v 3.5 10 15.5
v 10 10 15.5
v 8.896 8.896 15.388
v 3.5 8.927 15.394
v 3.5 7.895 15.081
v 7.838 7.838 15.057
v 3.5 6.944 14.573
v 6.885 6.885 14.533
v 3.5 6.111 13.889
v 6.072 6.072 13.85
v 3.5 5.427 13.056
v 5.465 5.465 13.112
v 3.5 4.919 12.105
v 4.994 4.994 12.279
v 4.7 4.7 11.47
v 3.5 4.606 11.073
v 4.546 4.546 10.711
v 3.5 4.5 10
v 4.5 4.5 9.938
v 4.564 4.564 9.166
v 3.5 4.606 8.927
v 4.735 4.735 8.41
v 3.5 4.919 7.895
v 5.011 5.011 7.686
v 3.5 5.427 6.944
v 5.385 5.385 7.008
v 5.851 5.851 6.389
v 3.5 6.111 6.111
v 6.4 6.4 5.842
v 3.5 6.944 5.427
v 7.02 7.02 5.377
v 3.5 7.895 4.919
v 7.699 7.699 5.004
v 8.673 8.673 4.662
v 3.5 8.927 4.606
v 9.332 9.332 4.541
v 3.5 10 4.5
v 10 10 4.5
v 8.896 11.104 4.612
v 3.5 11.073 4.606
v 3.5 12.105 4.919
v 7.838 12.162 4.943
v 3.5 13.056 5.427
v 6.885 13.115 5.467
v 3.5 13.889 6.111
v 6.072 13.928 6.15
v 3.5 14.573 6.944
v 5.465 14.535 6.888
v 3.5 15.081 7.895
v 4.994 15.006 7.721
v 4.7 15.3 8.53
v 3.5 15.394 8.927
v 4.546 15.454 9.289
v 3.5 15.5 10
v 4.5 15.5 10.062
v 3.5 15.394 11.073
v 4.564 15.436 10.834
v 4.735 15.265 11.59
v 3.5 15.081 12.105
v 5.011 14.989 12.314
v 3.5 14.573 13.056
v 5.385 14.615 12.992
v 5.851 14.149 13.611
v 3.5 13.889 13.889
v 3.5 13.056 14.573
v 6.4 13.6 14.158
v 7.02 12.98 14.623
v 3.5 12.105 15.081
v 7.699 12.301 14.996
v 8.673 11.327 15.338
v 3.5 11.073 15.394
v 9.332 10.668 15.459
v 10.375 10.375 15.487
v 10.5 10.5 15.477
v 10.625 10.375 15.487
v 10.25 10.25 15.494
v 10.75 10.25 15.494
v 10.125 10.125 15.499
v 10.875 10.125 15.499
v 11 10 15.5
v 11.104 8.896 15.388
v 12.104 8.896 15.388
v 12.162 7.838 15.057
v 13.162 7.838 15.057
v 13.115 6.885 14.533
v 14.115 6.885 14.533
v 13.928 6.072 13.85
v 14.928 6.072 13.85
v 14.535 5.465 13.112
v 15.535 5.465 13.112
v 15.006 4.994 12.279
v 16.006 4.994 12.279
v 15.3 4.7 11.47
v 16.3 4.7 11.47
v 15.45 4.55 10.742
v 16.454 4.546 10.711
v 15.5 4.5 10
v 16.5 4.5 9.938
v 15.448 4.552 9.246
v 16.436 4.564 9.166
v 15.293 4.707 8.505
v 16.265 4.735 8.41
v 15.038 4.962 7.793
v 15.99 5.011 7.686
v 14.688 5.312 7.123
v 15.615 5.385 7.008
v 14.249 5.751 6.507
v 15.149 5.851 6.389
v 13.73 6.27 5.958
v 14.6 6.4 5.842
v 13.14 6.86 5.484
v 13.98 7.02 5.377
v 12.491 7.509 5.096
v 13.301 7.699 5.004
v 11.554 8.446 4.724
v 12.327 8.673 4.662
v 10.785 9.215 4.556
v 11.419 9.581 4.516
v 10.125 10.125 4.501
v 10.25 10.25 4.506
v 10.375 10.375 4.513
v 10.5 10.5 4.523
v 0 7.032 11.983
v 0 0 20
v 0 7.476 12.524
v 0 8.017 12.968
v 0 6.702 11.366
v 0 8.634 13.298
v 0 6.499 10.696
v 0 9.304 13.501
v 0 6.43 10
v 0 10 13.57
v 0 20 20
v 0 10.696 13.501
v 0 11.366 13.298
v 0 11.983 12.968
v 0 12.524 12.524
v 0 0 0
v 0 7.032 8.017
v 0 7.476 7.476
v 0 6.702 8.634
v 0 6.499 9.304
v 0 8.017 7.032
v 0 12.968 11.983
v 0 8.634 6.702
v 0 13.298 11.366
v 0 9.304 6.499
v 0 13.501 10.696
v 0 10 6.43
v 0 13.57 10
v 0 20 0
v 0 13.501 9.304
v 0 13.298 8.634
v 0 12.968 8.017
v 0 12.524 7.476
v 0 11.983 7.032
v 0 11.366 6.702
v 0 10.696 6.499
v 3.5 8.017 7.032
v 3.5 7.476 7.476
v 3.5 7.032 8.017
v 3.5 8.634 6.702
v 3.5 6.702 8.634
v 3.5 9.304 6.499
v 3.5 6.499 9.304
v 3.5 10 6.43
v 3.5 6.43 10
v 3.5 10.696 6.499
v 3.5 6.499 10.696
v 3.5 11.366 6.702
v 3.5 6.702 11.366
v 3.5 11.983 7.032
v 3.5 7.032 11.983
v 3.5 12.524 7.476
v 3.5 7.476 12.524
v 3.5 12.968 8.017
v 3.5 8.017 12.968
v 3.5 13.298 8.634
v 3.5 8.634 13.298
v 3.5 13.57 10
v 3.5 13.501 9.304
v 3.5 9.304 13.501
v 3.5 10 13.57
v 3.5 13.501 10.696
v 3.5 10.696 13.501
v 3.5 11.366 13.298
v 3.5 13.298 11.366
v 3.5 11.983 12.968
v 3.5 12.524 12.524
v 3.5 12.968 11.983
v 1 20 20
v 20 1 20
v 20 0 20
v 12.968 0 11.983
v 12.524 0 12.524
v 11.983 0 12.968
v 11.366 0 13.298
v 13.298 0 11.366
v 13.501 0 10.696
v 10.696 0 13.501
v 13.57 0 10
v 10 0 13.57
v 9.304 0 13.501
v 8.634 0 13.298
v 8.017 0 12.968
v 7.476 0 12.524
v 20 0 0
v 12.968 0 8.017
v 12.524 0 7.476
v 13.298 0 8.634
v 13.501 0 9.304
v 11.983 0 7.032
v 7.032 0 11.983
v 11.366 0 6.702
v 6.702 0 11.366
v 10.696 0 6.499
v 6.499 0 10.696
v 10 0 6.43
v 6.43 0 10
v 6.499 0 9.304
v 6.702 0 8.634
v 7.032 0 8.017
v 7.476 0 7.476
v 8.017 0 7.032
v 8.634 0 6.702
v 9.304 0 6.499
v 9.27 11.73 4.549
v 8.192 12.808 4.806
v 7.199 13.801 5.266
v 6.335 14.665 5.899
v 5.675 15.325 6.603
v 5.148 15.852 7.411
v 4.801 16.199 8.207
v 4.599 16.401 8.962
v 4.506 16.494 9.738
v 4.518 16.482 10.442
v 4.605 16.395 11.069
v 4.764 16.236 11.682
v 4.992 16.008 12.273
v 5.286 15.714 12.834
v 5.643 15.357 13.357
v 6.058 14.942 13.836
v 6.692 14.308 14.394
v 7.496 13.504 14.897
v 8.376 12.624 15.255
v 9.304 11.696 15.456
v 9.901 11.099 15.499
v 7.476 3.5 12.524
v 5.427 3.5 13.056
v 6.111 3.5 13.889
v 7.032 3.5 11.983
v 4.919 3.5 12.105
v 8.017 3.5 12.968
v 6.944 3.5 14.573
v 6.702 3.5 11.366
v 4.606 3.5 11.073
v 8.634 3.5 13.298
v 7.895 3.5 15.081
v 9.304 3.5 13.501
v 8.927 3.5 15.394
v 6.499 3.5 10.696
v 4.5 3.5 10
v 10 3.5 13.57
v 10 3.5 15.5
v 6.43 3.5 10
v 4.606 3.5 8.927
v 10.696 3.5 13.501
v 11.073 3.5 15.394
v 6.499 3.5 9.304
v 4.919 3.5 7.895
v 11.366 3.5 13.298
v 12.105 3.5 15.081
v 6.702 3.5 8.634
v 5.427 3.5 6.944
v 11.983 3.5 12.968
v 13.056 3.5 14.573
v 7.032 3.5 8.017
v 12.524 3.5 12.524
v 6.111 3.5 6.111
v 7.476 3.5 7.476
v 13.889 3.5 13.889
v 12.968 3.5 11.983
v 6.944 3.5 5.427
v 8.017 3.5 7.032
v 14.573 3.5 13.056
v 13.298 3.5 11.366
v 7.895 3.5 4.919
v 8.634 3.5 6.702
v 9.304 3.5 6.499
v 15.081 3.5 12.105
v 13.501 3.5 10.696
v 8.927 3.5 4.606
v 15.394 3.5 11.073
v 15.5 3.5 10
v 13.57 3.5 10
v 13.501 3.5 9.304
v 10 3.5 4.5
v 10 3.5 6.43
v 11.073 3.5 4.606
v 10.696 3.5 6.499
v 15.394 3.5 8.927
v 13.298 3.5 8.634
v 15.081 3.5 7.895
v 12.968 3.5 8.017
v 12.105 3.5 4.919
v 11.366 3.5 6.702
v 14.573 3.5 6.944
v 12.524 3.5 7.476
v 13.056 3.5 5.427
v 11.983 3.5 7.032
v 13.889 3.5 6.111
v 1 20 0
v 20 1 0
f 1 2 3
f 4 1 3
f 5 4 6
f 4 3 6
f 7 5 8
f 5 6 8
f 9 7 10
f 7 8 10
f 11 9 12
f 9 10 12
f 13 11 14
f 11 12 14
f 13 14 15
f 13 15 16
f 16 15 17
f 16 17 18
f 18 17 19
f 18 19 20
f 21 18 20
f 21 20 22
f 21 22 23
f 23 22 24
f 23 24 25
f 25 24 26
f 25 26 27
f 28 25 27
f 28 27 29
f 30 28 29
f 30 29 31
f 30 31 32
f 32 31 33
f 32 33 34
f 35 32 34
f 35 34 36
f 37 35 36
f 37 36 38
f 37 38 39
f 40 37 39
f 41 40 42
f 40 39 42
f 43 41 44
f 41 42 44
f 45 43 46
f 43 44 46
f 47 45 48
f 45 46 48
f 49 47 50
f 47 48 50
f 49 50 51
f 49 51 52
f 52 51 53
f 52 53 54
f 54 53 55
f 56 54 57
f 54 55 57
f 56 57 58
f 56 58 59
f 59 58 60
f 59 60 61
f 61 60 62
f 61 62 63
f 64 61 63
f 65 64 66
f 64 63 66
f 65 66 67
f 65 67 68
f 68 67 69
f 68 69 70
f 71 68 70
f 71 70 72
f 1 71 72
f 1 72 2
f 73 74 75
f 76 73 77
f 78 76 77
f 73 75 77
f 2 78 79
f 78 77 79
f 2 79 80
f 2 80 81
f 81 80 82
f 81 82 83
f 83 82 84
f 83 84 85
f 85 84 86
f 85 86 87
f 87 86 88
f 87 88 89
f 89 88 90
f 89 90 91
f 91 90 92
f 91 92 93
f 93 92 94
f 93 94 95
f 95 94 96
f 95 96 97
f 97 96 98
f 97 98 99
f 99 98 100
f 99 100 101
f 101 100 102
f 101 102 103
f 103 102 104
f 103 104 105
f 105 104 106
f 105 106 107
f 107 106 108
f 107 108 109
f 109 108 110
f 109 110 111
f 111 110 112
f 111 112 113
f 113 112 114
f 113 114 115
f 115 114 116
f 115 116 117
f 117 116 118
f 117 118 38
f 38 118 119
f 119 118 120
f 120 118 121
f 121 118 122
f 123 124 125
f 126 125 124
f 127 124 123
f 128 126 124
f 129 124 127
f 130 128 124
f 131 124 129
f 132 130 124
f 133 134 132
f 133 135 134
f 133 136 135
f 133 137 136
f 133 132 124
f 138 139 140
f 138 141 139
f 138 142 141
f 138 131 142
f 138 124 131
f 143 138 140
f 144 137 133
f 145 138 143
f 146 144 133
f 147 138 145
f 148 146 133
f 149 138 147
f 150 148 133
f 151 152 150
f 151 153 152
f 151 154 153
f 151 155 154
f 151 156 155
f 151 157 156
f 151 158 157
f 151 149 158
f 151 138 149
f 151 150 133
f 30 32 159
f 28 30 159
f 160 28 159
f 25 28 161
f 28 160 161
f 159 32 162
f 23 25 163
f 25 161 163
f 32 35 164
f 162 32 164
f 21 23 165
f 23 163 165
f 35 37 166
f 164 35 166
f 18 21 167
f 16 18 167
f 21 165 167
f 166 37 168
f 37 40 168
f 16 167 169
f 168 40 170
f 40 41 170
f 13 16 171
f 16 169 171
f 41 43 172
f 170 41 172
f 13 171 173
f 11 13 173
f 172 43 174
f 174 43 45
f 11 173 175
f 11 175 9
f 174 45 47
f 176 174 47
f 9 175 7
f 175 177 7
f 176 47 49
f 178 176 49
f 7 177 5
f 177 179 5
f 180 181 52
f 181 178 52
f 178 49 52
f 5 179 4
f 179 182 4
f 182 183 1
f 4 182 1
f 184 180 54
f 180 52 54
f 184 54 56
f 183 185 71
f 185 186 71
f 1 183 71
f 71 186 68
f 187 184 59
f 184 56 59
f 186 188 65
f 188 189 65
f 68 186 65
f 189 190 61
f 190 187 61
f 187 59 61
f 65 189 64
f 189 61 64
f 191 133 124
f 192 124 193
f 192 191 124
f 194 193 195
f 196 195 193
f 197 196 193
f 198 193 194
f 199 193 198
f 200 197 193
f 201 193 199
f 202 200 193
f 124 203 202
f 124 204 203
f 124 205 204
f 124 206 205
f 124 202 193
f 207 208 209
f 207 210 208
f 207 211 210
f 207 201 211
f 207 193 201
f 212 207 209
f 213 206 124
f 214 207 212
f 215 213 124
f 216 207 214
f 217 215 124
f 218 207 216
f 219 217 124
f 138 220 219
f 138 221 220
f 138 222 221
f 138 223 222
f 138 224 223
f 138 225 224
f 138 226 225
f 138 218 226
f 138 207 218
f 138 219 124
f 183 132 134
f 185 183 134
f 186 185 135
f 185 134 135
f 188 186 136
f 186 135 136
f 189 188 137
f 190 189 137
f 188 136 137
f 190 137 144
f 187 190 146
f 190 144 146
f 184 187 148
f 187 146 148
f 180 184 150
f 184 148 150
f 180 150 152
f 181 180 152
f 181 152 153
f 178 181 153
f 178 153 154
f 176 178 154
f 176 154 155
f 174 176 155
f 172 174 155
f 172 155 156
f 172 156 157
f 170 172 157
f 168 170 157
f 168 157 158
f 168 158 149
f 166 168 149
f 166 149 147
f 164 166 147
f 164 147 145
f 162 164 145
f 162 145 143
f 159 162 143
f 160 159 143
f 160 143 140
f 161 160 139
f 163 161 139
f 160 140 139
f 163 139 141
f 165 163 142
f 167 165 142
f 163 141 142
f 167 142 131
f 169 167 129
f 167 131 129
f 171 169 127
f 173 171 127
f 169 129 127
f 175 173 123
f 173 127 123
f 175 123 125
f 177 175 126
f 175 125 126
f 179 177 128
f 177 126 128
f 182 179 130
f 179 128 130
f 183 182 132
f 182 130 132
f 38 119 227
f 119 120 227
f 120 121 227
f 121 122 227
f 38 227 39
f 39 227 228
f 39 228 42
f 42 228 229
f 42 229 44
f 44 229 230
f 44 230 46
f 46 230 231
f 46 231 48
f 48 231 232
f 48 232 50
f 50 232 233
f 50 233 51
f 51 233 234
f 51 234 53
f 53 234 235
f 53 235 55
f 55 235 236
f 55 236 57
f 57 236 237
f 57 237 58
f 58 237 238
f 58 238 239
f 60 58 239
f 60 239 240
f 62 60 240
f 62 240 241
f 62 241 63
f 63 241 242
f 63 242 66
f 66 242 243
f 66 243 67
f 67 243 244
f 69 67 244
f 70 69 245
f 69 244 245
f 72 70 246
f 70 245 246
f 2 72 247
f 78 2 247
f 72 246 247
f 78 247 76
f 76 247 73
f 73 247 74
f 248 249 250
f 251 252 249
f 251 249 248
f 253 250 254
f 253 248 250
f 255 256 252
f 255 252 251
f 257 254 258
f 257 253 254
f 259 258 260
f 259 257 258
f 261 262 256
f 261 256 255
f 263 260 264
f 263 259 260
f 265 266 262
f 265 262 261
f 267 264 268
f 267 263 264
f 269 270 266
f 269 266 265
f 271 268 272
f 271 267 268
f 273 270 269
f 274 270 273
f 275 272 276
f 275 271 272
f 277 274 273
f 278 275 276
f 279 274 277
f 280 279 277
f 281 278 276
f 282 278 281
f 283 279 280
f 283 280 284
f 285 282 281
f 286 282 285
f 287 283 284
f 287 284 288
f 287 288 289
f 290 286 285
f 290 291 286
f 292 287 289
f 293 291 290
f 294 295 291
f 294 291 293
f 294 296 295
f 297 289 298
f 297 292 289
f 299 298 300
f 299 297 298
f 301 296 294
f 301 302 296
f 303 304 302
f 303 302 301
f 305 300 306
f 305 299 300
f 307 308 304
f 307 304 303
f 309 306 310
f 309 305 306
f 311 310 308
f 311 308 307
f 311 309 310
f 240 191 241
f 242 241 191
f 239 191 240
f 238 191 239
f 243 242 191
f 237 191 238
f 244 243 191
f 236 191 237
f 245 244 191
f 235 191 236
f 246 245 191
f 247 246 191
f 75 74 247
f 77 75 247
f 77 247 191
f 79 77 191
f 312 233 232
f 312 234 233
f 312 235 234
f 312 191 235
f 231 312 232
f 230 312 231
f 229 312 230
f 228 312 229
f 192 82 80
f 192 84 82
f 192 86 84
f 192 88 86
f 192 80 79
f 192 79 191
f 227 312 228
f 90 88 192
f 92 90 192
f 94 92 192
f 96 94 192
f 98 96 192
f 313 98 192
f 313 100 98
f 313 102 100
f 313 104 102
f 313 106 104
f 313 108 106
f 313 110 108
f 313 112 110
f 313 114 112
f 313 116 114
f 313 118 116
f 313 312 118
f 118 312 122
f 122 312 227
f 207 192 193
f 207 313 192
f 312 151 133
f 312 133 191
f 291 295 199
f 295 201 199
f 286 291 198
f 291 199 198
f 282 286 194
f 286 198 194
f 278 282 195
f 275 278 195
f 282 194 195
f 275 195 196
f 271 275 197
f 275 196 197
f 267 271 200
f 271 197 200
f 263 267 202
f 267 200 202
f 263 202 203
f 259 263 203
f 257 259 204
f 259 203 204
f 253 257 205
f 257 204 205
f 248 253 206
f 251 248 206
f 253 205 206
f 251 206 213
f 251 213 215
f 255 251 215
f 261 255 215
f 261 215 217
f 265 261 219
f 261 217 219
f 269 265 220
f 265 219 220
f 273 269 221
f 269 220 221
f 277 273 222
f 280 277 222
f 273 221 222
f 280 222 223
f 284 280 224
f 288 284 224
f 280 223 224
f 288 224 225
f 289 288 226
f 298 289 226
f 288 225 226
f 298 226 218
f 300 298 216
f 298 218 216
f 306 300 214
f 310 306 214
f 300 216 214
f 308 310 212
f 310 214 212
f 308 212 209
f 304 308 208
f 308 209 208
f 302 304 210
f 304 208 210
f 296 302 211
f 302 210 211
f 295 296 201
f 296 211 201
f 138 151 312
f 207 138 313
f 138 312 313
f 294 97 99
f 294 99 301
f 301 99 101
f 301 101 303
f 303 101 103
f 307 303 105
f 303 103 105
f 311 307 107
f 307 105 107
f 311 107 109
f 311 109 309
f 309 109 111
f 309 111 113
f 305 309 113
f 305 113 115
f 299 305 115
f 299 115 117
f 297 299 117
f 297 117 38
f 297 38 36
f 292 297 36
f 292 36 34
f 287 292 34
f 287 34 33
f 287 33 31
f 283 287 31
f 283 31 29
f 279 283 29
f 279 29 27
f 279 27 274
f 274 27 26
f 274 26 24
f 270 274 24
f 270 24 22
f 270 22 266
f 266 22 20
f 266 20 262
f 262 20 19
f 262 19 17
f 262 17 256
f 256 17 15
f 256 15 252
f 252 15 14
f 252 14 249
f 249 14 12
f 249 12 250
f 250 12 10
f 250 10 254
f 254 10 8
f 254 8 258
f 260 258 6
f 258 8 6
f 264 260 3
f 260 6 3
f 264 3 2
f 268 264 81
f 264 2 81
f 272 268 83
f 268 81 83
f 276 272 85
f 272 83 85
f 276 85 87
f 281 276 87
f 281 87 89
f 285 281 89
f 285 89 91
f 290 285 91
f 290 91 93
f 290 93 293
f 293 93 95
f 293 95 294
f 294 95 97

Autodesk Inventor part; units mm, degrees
ref_plane "YZ Plane" through (0, 0, 0) normal (1, 0, 0) x (0, 1, 0)
ref_plane "XZ Plane" through (0, 0, 0) normal (0, 1, 0) x (-1, 0, 0)
sketch "Sketch1" plane through (0, 0, 0) normal (0, 0, 1) x (1, 0, 0)
  line L0 (0, 0) -> (0, 20)
  line L1 (20, 0) -> (0, 0)
  line L2 (0, 20) -> (1, 20)
  line L3 (1, 20) -> (20, 1.0001)
  line L4 (20, 1.0001) -> (20, 0)
  dimension "d0" = 20
  dimension "d1" = 20
  dimension "d2" = 1
  dimension "d3" = 26.87
  dimension "d4" = 1.0001
extrude "Extrusion1" add sketch "Sketch1" along normal blind 20
sketch "Sketch2" plane through (0, 0, 0) normal (-1, 0, 0) x (0, 0, 1)
  line L0 (0, 0) -> (20, 0) projected
  circle A0 centre (10, 10) radius 3.57
  circle A1 centre (10, 10) radius 5.5
  line L1 (10, 19.6278) -> (10, 0) construction
  dimension "d7" = 7.14
  dimension "d8" = 11
  dimension "d9" = 4.5
extrude "Extrusion2" cut sketch "Sketch2" against normal through all contours A0
sketch "Sketch3" plane through (0, 0, 0) normal (0, -1, 0) x (1, 0, 0)
  circle A0 centre (10, 10) radius 3.57
  dimension "d12" = 7.14
extrude "Extrusion3" cut sketch "Sketch3" against normal through all
ref_plane "Work Plane1" through (20, 1.0001, 20) normal (-1, 0, 0) x (0, 0, 1)
sketch "Sketch4" plane through (20, 1.0001, 20) normal (-1, 0, 0) x (0, 0, 1)
  circle A0 centre (-10, 8.9999) radius 3.57 projected
  circle A1 centre (-10, 8.9999) radius 5.5
  point P0 (-20, -1.0001)
  dimension "d15" = 11
extrude "Extrusion4" cut sketch "Sketch4" along normal blind 16.5
sketch "Sketch5" plane through (0, 20, 0) normal (0, 1, 0) x (1, 0, 0)
  circle A0 centre (10, -10) radius 5.5
  dimension "d18" = 11
extrude "Extrusion5" cut sketch "Sketch5" against normal blind 16.5
equation "\"d1\" = d0"
properties part number "90 Degree Corner Connector" material "Acetal Resin, White"
